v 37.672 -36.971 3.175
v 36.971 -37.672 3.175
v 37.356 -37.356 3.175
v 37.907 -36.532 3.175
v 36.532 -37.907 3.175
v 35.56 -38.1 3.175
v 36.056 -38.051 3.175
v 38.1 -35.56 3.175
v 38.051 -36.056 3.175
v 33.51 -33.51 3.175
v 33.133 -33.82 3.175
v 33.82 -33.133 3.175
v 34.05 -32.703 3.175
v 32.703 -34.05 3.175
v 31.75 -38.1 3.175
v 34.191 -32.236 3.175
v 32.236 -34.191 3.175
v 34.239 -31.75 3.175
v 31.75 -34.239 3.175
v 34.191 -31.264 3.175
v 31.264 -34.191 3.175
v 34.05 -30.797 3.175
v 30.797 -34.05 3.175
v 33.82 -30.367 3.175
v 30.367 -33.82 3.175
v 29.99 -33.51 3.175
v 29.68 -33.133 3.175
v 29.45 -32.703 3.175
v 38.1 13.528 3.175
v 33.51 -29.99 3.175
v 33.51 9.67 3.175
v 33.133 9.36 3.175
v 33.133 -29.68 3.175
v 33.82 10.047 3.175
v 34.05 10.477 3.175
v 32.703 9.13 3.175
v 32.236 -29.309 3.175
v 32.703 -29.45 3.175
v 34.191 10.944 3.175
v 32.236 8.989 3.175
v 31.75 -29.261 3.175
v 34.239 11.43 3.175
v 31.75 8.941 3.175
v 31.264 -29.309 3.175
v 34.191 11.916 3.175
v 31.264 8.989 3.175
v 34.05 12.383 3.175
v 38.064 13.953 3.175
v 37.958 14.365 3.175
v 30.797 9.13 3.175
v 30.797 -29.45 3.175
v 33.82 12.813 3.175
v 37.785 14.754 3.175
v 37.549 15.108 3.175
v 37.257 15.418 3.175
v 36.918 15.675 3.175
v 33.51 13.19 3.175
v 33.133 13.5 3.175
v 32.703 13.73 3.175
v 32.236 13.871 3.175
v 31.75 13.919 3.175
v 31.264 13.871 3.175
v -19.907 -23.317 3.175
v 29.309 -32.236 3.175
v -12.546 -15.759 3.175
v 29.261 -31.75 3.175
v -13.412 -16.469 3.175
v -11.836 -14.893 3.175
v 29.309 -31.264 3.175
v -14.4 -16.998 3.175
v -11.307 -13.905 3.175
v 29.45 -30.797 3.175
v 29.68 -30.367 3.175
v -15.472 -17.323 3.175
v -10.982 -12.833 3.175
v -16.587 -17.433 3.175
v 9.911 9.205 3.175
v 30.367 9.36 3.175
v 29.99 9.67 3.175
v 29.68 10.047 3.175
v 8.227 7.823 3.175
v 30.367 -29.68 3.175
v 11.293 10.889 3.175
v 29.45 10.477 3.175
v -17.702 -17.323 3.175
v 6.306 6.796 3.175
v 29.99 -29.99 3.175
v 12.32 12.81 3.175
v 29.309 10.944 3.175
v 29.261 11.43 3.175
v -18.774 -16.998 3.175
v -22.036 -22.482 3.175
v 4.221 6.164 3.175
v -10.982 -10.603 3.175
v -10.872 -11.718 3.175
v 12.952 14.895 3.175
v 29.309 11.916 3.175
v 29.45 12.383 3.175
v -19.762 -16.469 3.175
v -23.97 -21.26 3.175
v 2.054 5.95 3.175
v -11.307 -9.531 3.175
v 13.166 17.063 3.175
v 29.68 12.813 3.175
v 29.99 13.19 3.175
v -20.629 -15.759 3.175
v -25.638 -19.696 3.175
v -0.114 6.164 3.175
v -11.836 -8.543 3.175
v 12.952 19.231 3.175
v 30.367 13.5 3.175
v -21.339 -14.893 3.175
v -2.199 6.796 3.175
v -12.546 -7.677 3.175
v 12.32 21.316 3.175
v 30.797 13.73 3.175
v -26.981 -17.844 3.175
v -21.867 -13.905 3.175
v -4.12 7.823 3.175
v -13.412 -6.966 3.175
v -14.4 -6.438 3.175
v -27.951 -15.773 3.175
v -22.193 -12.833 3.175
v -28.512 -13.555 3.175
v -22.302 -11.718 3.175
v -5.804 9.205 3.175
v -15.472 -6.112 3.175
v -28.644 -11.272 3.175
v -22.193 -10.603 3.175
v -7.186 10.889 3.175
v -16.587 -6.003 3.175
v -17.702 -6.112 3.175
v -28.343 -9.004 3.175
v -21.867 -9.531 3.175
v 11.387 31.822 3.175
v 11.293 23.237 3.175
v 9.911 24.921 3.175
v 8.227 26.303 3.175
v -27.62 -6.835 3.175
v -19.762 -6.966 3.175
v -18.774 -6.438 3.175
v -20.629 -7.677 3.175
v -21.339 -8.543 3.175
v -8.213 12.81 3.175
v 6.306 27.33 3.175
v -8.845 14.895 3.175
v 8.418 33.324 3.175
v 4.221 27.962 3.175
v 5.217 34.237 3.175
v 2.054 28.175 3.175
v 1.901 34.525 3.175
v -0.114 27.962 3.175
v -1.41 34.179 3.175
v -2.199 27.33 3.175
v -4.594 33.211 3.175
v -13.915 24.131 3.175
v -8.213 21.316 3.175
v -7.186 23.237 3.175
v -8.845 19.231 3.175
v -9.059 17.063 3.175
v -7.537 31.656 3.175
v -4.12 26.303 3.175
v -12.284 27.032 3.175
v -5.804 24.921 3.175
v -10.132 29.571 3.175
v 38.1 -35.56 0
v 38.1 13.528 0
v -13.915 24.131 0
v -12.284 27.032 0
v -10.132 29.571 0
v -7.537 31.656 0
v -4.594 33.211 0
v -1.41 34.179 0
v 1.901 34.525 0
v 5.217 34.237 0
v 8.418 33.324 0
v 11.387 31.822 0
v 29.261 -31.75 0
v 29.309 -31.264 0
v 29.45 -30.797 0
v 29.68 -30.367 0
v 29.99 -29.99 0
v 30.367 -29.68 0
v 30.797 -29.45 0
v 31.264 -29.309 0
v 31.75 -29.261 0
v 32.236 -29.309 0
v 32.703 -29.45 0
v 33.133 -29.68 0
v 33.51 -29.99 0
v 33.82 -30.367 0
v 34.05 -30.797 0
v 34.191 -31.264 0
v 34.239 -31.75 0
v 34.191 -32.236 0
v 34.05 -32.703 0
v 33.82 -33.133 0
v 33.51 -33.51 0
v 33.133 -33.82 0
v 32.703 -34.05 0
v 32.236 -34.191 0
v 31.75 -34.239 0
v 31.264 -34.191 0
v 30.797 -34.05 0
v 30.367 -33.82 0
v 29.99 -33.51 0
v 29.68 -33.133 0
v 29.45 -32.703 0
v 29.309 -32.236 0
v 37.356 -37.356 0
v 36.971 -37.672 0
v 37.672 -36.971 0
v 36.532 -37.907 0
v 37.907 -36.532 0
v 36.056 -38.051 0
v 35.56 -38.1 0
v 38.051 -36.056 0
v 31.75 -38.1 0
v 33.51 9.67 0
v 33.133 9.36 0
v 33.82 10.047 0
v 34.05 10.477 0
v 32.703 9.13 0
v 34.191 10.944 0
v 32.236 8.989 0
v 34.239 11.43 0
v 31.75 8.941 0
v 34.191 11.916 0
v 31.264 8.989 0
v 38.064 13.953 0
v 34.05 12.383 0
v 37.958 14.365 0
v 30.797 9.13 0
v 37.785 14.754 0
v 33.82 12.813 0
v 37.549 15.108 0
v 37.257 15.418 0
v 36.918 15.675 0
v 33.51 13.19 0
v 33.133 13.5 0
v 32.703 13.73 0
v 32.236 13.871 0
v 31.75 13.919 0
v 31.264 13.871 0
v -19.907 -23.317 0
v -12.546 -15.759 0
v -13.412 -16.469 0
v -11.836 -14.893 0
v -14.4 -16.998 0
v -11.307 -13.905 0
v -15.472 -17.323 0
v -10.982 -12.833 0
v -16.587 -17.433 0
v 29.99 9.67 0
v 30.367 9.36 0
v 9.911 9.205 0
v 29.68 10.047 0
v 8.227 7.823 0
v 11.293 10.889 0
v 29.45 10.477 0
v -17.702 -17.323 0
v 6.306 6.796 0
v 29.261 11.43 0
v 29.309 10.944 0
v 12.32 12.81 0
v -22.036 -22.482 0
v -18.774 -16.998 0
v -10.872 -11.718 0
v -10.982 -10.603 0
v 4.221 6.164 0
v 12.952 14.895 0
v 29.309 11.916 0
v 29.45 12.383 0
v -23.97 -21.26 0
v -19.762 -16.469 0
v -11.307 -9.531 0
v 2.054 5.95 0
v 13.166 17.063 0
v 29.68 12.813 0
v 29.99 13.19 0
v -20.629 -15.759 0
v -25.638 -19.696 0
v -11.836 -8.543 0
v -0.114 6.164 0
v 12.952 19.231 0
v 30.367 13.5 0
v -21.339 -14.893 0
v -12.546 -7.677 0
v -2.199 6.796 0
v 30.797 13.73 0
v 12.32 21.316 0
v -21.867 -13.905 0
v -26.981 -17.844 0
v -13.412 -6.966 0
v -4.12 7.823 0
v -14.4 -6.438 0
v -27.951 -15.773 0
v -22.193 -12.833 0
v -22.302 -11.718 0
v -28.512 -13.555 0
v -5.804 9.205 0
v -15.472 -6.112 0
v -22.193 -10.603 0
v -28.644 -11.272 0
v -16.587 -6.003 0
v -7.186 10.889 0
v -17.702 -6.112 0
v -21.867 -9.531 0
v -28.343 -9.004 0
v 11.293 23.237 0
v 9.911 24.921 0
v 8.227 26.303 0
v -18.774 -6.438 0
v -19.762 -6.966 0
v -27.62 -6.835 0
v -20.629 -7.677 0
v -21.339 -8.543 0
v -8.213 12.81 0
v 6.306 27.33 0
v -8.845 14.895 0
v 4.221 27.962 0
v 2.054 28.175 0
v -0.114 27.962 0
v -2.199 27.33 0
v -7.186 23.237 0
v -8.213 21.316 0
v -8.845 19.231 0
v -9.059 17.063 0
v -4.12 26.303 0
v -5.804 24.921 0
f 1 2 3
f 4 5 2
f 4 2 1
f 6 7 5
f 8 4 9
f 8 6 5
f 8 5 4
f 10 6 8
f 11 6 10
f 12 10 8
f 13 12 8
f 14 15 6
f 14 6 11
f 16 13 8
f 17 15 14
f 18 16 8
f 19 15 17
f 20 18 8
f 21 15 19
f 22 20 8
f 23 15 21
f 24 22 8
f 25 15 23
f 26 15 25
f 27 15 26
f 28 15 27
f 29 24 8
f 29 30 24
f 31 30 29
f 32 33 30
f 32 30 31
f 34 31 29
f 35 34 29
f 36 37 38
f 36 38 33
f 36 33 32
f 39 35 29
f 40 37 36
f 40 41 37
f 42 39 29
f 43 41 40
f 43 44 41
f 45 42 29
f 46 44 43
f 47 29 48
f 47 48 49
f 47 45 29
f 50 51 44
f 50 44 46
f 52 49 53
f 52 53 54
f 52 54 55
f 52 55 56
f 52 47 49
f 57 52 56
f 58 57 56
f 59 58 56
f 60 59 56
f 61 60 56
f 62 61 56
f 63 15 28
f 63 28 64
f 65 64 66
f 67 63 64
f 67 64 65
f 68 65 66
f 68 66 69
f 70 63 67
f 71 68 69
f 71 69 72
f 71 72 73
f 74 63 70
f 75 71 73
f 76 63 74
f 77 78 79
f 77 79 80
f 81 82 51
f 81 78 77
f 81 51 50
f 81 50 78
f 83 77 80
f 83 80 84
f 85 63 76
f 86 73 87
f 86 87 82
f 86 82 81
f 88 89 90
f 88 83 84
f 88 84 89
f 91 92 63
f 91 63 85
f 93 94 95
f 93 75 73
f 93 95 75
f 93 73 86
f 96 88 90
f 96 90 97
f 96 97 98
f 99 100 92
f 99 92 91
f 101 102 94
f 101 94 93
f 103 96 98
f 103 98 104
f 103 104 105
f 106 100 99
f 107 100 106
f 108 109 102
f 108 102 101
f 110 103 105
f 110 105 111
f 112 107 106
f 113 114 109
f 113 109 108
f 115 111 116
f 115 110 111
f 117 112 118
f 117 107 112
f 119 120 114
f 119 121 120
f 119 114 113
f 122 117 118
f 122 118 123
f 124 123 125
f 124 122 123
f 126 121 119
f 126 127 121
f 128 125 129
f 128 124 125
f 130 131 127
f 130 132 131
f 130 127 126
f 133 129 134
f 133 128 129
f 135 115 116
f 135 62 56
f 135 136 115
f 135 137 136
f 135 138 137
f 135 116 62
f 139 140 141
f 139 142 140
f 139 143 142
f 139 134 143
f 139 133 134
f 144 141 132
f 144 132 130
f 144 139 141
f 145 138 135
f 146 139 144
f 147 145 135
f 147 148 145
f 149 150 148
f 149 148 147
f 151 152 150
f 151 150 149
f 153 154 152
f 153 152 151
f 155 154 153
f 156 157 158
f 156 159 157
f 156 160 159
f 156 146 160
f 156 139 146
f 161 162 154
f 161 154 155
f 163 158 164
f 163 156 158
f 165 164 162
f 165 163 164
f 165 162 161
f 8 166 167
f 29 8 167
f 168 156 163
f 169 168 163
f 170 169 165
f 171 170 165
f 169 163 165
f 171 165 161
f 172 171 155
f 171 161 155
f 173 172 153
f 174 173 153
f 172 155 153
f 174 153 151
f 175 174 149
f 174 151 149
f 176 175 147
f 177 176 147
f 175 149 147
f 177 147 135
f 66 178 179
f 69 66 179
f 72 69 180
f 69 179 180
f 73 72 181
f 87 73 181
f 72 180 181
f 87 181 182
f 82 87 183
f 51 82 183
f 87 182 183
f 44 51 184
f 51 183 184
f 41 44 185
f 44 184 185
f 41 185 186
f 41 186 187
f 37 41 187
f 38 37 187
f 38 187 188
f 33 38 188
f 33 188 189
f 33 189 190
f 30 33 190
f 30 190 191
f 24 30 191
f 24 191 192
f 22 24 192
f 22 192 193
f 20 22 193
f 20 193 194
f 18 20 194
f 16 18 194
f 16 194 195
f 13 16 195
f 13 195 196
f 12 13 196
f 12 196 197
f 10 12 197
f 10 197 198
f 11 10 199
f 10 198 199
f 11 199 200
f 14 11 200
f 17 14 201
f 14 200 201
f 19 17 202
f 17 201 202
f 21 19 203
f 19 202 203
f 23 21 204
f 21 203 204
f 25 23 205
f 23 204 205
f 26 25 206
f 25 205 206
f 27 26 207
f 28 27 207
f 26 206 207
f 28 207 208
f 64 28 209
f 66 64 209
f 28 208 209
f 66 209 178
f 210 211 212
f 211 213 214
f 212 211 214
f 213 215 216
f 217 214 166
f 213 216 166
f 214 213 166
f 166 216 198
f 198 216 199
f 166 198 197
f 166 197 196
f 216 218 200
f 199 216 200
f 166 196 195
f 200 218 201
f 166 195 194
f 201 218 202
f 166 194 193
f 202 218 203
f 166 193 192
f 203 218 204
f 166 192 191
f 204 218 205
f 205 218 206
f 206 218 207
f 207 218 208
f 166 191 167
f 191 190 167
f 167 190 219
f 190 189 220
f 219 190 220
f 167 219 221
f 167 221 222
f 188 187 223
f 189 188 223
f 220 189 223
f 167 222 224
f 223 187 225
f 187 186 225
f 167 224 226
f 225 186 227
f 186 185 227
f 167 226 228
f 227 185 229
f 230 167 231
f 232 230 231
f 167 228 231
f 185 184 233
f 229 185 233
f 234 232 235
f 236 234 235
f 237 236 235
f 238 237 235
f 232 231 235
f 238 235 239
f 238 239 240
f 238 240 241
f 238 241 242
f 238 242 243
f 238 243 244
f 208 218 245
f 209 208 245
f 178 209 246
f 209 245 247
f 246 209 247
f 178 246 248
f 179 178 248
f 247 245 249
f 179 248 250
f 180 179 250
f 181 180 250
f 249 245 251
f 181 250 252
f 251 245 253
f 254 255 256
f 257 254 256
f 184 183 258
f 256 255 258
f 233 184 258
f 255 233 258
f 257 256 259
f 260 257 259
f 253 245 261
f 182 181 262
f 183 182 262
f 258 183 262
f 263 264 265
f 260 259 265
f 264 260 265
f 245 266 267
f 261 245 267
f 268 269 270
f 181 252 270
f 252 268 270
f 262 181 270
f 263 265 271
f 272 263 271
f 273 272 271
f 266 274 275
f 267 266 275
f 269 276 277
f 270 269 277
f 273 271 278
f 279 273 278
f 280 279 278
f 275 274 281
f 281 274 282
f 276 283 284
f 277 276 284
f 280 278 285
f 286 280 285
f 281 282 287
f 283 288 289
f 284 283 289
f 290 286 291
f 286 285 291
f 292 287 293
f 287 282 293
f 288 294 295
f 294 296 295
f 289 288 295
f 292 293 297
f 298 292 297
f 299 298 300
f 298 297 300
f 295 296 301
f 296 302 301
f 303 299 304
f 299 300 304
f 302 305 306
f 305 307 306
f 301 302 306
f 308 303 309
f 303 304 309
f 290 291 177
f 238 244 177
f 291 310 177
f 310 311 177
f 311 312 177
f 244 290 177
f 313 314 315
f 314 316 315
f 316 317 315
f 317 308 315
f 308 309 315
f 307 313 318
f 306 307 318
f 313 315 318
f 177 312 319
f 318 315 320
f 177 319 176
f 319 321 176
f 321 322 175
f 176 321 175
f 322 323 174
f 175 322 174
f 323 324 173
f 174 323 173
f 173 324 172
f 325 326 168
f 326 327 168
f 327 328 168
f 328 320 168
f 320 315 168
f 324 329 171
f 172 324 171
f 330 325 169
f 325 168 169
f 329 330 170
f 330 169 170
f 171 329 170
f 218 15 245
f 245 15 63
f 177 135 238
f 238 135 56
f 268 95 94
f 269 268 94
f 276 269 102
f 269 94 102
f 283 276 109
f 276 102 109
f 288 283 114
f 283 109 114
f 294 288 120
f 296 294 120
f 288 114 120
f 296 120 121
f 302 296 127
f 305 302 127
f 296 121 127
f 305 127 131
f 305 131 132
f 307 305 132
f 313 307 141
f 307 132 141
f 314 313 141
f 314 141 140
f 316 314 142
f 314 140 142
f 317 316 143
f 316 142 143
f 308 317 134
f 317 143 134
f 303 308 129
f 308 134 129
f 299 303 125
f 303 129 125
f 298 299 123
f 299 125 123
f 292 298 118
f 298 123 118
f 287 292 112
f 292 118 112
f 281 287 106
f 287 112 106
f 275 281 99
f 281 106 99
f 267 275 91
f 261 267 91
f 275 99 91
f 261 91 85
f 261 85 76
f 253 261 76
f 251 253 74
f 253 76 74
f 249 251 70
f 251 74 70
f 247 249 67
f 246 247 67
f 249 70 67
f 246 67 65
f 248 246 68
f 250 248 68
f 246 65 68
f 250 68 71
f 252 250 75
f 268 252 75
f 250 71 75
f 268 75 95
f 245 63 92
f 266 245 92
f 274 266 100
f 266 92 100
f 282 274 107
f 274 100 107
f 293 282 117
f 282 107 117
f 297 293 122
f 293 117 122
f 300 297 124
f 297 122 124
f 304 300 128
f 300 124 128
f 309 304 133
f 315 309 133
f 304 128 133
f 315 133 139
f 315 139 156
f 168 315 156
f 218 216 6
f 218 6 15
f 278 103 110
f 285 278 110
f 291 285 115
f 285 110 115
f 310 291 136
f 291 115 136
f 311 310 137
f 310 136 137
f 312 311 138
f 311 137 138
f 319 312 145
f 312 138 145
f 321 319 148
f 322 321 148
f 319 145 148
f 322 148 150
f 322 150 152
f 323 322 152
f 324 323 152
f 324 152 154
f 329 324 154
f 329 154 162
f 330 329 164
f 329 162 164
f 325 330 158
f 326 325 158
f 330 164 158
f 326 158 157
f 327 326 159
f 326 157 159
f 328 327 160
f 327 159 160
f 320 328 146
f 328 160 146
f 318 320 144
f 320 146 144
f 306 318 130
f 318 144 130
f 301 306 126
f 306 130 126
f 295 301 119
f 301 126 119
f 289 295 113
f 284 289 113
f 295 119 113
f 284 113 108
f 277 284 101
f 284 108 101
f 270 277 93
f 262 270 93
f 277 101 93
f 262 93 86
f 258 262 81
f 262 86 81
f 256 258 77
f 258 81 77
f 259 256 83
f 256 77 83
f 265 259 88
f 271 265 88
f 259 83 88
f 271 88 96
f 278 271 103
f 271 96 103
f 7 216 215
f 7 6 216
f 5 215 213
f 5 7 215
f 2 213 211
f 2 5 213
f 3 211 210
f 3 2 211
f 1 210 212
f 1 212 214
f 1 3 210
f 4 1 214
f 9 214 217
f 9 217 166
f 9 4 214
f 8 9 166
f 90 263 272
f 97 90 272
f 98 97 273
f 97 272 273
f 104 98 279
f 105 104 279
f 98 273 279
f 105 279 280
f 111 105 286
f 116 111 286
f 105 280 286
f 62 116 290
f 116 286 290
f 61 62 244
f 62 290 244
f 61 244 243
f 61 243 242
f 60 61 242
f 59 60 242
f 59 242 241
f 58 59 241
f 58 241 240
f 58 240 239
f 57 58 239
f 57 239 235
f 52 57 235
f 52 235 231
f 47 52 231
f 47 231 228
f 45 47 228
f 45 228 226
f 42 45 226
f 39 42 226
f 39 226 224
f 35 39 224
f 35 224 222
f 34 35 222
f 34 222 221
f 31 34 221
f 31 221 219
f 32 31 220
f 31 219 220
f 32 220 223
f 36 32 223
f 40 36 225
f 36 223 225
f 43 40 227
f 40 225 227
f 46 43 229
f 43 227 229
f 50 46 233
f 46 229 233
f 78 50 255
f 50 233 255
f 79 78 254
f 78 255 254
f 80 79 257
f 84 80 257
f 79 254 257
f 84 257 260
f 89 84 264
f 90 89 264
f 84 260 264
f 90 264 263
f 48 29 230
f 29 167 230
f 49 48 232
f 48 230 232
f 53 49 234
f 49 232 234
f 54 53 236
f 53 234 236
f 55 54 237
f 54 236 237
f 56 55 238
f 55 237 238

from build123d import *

# Parameters (mm, degrees)
SKETCH1_W                  = 76.2
SKETCH1_H                  = 76.2
BOSS_EXTRUDE1_DEPTH        = 3.175
F_9_0_196_DIAMETER_HOLE1_D = 4.9784
SKETCH4_R                  = 5.715
SKETCH4_R_2                = 11.1125
CUT_EXTRUDE1_DEPTH         = 3.175
CUT_EXTRUDE2_DEPTH         = 3.175
FILLET1_R                  = 2.54


with BuildPart() as part:
    # Sketch1 → Boss-Extrude1 (new body)
    with BuildSketch(Plane(origin=(0, 0, 0), x_dir=(0, 1, 0), z_dir=(0, 0, 1))):
        Rectangle(SKETCH1_W, SKETCH1_H)
    extrude(amount=BOSS_EXTRUDE1_DEPTH)

    # #9 (0.196) Diameter Hole1 (through all)
    with Locations(Plane.XY.offset(3.175)):
        with Locations((31.75, -31.75), (31.75, 11.43)):
            Hole(F_9_0_196_DIAMETER_HOLE1_D / 2)

    # Sketch4 → Cut-Extrude1 (cut)
    with BuildSketch(Plane.XY.offset(3.175)):
        with Locations((-16.587404081, -11.717617647)):
            Circle(SKETCH4_R)
        with Locations((2.053516604, 17.062934398)):
            Circle(SKETCH4_R_2)
    extrude(amount=-CUT_EXTRUDE1_DEPTH, mode=Mode.SUBTRACT)

    # Sketch6 → Cut-Extrude2 (cut)
    with BuildSketch(Plane.XY.offset(3.175)):
        with BuildLine():
            Line((11.387489681, 31.821520131), (38.1, 14.927363968))
            Line((38.1, 14.927363968), (38.1, 38.1))
            Line((38.1, 38.1), (-38.1, 38.1))
            Line((-38.1, 38.1), (-38.1, -38.1))
            Line((-38.1, -38.1), (31.75, -38.1))
            Line((31.75, -38.1), (-19.906877313, -23.316984977))
            ThreePointArc((-19.906877313, -23.316984977), (-27.515067303, -16.831363975), (-27.620065644, -6.834523972))
            Line((-27.620065644, -6.834523972), (-13.914809342, 24.13056998))
            ThreePointArc((-13.914809342, 24.13056998), (-3.025000705, 33.770644241), (11.387489681, 31.821520131))
        make_face()
    extrude(amount=-CUT_EXTRUDE2_DEPTH, mode=Mode.SUBTRACT)

    # Fillet1
    fillet1_edges = [part.edges().sort_by_distance(p)[0] for p in [
        (38.1, 14.927363968, 1.5875),
        (38.1, -38.1, 1.5875),
    ]]
    fillet(fillet1_edges, radius=FILLET1_R)


solid = part.part
